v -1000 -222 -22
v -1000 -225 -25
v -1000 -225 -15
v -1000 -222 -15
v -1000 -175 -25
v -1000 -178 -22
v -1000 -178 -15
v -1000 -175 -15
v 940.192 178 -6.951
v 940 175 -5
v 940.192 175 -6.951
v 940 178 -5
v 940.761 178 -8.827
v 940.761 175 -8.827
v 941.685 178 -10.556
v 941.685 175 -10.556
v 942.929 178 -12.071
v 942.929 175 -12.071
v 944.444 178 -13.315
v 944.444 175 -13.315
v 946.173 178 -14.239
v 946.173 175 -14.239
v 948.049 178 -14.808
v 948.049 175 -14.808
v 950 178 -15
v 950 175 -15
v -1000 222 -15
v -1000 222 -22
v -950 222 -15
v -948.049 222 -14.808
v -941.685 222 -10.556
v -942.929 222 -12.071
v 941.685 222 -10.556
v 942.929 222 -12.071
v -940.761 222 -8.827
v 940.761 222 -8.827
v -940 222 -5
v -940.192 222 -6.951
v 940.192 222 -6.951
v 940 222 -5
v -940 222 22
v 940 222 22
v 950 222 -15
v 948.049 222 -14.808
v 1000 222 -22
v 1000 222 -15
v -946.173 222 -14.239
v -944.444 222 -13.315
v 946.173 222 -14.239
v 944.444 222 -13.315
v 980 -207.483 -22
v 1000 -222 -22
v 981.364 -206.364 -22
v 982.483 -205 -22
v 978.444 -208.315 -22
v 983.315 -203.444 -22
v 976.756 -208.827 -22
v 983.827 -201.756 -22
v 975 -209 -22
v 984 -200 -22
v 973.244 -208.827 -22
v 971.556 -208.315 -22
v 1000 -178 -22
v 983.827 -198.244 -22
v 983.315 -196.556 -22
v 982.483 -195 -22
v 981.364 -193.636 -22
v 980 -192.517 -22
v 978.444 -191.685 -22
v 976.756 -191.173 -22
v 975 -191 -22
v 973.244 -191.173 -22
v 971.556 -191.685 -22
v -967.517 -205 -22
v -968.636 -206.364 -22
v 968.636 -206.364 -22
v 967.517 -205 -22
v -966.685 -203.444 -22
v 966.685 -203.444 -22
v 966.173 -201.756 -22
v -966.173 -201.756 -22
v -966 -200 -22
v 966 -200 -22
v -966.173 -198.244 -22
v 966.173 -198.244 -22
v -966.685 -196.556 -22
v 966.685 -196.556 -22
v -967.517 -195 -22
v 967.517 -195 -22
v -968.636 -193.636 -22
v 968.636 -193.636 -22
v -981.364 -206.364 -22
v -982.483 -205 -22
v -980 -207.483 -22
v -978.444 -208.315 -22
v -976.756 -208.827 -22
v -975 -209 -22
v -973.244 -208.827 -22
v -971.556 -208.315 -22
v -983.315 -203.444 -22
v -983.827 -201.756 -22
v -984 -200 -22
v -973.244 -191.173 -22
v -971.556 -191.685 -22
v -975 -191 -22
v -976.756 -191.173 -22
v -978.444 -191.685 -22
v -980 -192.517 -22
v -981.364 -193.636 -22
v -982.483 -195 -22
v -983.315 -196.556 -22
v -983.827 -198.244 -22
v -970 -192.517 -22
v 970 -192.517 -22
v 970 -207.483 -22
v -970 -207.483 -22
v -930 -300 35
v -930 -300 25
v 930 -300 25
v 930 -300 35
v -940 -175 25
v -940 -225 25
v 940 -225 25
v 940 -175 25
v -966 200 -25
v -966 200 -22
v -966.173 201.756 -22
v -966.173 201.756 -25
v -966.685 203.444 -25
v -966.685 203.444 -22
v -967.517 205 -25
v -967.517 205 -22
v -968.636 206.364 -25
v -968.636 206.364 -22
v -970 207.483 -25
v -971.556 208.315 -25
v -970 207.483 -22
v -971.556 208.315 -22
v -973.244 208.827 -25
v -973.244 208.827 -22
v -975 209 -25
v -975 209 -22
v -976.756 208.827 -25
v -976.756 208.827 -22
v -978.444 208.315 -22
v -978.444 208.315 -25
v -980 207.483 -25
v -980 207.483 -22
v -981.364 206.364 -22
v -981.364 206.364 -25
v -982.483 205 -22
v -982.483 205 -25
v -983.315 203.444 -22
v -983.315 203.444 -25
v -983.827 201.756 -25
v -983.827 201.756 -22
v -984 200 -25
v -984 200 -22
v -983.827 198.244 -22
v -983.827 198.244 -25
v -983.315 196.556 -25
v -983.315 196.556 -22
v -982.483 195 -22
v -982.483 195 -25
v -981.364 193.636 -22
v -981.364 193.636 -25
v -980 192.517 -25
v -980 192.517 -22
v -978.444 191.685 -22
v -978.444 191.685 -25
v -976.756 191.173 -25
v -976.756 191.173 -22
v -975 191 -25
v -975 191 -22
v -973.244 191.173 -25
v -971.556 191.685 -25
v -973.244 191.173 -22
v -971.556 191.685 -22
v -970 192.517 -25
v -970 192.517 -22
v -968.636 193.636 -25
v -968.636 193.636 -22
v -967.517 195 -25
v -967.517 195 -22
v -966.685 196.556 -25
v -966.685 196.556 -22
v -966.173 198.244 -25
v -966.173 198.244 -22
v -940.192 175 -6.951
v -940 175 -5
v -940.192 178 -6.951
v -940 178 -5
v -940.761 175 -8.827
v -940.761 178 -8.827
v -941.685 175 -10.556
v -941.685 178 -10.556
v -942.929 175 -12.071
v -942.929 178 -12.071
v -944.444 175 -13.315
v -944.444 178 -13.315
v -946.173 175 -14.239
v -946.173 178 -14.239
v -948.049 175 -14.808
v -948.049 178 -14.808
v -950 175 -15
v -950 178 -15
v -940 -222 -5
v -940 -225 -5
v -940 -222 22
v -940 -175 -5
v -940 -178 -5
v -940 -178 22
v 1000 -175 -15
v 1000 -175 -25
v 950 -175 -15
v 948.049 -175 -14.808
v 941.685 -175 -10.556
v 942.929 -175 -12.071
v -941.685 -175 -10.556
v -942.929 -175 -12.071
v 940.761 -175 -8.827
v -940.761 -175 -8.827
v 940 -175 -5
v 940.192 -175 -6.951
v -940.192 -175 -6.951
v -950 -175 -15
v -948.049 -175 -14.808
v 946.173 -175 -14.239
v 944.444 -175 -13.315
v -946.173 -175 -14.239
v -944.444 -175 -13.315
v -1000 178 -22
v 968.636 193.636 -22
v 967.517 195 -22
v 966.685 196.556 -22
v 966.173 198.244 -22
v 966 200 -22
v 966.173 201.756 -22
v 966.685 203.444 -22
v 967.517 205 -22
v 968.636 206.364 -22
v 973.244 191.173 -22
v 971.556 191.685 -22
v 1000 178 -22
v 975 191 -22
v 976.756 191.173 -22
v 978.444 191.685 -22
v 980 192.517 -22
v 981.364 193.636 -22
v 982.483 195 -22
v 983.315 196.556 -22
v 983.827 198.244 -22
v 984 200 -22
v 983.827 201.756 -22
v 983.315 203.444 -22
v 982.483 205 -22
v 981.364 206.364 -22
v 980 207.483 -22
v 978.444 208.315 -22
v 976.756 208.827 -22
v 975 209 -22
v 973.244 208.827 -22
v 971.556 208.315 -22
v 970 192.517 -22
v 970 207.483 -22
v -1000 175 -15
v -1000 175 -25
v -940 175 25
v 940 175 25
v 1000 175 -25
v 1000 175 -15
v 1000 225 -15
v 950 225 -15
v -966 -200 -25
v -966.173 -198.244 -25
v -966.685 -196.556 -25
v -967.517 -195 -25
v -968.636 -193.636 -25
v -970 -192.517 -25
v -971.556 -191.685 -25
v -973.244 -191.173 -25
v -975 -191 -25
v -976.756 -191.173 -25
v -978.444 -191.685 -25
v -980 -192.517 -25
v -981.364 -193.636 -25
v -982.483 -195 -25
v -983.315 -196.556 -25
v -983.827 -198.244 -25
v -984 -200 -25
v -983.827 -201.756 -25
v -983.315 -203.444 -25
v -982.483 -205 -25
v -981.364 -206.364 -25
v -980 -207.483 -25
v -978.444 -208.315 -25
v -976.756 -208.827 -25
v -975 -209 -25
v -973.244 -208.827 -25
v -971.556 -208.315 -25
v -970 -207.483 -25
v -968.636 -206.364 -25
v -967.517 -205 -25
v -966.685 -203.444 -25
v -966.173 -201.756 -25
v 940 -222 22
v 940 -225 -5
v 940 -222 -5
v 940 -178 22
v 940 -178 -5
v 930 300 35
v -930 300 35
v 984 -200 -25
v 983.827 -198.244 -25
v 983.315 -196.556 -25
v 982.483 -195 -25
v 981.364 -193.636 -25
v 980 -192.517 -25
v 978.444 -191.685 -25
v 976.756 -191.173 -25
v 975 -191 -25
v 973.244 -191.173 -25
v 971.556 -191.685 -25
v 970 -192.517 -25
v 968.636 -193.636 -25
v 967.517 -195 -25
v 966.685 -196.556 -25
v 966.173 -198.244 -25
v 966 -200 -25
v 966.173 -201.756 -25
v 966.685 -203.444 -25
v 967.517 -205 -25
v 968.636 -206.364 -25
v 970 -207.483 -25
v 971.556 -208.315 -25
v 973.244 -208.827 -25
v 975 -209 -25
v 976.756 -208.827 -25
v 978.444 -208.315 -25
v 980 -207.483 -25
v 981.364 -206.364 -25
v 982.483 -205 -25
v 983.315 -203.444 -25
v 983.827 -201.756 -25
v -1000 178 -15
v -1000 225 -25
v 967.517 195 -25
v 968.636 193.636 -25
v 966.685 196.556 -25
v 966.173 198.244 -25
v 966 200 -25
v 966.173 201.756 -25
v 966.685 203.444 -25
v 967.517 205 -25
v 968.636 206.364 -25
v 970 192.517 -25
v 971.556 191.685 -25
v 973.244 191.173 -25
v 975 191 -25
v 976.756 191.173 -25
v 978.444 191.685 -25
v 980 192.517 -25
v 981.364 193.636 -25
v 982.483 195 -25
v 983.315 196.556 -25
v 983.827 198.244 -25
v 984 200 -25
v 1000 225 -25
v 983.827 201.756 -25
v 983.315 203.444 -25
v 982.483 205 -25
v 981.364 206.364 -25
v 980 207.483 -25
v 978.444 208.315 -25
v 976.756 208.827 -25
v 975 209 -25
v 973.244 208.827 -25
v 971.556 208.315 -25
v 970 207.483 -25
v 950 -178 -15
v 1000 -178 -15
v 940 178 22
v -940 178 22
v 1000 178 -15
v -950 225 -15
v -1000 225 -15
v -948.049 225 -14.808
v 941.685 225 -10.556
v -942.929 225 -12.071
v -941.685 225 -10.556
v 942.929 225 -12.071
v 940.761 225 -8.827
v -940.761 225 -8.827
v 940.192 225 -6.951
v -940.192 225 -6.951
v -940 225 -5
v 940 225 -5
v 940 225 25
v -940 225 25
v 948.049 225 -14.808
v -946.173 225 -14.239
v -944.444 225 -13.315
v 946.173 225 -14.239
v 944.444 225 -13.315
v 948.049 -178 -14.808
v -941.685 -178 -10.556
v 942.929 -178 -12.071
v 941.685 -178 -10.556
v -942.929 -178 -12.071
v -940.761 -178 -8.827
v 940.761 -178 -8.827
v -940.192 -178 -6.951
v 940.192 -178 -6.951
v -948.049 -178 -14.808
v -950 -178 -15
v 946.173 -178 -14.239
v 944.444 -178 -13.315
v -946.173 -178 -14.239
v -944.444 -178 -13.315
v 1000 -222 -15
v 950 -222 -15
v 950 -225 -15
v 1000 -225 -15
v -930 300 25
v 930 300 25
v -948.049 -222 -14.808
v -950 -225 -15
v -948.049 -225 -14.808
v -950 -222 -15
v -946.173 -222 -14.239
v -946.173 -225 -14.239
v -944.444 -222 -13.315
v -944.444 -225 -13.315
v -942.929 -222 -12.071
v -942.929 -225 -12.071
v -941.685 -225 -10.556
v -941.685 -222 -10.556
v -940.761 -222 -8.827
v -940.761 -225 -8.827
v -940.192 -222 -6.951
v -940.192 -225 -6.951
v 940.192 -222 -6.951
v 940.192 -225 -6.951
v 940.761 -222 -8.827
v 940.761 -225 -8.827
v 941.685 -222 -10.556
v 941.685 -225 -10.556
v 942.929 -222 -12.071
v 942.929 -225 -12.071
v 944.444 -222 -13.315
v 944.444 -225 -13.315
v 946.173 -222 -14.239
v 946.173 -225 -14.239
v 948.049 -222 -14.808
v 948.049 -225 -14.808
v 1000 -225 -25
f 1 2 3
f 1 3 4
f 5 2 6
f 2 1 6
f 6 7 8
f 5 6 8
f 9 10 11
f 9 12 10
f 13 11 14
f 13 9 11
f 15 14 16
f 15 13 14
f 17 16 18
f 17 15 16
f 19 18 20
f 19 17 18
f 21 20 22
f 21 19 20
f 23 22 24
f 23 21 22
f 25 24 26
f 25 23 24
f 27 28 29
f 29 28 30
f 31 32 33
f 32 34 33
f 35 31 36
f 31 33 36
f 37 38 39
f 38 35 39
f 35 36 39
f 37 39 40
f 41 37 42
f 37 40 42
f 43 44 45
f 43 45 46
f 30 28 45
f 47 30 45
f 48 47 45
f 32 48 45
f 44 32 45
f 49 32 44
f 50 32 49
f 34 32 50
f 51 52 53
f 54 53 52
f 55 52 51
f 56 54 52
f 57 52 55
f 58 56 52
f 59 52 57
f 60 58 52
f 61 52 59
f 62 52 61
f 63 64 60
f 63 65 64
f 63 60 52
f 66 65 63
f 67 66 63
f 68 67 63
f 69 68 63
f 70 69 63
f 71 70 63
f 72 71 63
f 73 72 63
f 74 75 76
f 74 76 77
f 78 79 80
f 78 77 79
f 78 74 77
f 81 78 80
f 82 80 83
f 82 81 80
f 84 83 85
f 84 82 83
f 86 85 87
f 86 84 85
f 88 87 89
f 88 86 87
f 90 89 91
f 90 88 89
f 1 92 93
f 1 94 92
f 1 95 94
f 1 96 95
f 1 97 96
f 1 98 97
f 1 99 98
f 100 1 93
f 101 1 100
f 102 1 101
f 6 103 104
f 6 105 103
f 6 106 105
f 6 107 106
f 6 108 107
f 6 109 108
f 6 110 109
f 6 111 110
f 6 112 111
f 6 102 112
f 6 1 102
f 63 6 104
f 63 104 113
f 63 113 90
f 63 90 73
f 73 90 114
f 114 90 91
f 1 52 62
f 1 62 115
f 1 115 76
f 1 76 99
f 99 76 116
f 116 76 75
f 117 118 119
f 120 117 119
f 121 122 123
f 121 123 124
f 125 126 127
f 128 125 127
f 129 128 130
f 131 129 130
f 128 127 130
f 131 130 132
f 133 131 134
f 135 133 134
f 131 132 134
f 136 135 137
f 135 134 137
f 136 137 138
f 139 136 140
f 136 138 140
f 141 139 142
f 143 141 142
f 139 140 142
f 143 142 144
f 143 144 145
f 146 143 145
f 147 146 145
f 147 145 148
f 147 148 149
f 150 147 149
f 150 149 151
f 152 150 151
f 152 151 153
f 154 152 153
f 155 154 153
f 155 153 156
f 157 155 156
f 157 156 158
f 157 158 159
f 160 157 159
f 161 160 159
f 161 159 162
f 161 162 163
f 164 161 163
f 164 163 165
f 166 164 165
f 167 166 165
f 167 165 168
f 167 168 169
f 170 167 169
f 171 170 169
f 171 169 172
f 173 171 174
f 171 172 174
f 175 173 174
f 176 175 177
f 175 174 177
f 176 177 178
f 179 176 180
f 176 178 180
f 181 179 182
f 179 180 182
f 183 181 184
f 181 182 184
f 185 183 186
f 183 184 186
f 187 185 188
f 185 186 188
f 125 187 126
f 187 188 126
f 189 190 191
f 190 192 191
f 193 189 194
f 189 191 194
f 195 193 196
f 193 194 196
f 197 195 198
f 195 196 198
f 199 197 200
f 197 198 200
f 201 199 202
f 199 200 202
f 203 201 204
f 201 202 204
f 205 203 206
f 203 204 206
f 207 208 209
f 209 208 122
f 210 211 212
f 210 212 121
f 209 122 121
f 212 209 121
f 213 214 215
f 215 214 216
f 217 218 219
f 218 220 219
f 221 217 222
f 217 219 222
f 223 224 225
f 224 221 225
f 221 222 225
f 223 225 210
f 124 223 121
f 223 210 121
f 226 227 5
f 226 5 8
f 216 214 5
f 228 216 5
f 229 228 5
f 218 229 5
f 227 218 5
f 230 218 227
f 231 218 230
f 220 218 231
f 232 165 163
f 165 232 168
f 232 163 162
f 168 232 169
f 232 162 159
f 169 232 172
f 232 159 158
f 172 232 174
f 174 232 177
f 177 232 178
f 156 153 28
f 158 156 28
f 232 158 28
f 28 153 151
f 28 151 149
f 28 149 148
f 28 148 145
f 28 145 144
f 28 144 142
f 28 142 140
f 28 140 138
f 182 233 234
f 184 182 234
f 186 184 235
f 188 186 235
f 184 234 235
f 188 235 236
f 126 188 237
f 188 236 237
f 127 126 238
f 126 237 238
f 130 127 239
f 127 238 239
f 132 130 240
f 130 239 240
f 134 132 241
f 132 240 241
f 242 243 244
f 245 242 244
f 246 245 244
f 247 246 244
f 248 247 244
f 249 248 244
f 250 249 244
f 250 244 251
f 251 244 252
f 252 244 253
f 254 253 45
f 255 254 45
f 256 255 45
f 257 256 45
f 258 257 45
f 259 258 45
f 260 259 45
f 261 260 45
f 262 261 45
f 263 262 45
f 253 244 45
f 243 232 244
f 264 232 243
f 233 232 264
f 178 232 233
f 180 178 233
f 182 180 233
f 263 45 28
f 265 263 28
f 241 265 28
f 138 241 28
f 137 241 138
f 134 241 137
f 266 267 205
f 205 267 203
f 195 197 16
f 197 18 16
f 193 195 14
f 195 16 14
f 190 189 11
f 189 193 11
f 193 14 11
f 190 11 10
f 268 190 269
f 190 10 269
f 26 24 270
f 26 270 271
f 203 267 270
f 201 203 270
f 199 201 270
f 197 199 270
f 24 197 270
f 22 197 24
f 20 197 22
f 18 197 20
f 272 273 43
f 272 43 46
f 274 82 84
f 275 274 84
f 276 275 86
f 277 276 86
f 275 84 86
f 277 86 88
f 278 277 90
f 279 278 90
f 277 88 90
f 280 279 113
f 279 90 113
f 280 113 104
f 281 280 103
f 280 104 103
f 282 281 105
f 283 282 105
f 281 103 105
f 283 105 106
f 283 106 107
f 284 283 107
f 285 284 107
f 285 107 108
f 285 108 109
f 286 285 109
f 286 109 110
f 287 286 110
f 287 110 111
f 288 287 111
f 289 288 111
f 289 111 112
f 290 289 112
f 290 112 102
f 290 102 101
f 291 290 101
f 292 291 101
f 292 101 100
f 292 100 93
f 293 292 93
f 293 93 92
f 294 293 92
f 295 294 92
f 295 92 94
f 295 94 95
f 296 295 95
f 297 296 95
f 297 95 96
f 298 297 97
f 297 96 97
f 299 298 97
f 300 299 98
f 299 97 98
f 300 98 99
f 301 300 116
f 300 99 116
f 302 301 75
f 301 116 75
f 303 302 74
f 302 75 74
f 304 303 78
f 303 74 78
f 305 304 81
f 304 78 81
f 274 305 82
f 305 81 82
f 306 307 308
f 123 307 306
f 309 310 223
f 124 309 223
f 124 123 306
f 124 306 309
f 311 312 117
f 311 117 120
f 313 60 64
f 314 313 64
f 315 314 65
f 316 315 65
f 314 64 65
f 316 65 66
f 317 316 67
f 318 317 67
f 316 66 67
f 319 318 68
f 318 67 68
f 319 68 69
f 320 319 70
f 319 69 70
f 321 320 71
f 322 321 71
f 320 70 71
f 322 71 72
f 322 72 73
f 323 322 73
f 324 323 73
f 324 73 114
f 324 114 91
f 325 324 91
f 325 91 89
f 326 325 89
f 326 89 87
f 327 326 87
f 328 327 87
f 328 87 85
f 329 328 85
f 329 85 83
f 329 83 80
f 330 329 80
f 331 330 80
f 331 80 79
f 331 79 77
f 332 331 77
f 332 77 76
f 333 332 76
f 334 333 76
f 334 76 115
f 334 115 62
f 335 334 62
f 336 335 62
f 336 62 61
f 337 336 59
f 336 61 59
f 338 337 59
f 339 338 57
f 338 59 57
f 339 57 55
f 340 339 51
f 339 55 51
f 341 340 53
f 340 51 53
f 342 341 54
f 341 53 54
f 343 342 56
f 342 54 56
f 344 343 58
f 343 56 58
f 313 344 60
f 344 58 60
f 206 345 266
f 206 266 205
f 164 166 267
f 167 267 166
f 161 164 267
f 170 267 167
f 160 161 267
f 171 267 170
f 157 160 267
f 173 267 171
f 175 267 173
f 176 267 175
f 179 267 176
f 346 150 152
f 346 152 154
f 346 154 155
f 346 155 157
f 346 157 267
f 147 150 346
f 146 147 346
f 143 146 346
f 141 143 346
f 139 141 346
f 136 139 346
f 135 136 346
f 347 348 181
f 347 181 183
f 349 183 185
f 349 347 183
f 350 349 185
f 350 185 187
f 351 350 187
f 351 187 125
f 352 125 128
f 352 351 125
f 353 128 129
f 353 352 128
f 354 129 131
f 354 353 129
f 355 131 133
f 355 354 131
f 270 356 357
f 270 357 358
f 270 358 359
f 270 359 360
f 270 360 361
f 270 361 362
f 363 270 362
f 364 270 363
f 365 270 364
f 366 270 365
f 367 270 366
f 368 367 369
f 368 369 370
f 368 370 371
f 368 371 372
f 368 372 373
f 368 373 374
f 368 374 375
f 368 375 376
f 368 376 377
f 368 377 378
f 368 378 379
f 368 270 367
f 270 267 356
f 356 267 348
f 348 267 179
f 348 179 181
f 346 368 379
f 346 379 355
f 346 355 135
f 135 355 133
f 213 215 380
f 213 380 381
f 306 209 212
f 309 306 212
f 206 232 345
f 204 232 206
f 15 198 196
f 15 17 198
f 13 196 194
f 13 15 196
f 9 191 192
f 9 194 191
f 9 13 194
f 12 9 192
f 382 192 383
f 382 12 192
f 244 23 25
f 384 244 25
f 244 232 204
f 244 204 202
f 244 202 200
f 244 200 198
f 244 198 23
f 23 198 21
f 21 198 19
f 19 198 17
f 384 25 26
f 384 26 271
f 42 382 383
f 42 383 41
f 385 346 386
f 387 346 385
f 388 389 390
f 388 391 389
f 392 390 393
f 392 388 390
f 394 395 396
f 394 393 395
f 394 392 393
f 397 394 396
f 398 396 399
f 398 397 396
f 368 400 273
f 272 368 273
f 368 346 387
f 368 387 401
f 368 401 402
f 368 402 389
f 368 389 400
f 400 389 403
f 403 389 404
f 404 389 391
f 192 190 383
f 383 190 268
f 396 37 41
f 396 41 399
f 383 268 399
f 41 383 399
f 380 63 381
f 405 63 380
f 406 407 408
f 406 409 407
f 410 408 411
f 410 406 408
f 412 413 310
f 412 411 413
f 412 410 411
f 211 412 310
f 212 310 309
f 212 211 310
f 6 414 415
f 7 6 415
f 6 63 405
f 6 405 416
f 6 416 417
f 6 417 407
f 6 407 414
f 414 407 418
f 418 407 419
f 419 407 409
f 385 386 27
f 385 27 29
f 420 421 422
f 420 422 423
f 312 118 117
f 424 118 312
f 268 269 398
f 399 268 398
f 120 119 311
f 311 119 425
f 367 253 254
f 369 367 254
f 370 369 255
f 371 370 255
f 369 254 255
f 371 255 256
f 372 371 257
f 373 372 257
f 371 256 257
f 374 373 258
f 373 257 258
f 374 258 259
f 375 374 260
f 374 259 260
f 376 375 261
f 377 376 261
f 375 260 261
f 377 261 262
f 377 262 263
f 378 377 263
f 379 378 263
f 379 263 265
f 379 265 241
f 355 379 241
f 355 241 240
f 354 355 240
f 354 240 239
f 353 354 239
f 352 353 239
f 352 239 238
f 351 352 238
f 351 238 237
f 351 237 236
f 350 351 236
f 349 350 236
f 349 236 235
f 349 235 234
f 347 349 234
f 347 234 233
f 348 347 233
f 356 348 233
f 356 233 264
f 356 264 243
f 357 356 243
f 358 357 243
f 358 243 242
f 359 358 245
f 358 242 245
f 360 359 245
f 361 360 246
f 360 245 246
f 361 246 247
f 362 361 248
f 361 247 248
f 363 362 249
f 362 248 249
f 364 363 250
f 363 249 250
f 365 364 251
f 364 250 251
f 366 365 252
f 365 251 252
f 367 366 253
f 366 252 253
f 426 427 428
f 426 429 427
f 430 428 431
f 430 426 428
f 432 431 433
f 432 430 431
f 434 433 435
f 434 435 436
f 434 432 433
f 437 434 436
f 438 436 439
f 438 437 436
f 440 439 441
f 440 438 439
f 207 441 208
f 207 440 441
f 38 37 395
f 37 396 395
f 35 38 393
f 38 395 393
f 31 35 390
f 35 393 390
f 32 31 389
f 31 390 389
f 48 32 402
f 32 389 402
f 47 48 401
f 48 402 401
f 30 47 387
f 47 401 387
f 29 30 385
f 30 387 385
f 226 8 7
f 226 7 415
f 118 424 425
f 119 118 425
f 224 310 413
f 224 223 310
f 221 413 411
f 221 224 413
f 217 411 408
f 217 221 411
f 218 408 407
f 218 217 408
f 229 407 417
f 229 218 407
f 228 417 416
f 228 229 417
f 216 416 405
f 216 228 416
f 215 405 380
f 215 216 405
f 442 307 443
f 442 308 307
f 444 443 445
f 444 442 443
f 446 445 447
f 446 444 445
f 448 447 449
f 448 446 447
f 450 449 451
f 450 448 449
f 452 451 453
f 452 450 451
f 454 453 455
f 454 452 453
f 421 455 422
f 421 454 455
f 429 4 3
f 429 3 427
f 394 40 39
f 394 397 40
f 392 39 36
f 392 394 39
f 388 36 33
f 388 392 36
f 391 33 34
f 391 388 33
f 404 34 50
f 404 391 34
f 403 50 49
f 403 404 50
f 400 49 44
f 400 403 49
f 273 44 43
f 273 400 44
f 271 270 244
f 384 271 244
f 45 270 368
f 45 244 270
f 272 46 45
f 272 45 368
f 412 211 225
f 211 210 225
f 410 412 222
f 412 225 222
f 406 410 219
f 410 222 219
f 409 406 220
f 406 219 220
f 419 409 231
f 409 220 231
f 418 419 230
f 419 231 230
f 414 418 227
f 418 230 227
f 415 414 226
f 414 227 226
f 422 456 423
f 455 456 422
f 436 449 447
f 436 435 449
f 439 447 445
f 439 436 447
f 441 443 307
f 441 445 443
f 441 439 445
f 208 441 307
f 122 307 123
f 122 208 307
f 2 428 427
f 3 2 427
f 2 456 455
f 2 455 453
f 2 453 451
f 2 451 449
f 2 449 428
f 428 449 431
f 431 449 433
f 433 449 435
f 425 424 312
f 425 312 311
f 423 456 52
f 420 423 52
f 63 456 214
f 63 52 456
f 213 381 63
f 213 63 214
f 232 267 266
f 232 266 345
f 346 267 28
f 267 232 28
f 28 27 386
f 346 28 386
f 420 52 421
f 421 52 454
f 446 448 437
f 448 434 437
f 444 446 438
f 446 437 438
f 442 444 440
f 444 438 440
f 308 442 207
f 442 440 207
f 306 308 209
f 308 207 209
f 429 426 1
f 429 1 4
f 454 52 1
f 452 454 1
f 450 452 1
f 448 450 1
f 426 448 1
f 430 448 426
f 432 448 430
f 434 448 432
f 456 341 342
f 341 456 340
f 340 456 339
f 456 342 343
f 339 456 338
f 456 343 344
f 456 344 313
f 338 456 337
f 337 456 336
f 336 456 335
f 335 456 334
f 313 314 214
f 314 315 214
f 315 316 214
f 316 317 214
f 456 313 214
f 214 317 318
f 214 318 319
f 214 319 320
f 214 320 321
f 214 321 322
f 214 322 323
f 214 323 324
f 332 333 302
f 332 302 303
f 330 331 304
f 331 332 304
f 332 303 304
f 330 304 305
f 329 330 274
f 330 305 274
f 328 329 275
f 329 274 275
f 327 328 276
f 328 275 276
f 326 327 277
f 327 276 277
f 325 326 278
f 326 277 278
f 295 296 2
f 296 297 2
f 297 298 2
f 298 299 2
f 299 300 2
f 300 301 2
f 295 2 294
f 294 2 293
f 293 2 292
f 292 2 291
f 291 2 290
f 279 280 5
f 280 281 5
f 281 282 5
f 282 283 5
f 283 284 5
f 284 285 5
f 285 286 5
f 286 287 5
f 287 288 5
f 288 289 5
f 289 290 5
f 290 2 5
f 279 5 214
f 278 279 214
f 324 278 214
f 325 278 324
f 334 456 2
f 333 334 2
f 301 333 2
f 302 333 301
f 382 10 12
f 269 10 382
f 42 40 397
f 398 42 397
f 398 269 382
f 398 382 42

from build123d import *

# Parameters (mm, degrees)
F0_W     = 50
F0_H     = 50
F0_W_2   = 44
F0_H_2   = 44
F1_DEPTH = 1000
F2_W     = 1860
F2_H     = 600
F3_DEPTH = 10
F4_W     = 60
F4_H     = 50
F5_DEPTH = 40
F6_R     = 10
F7_R     = 10
F8_R     = 9
F9_DEPTH = 5


with BuildPart() as f1:
    # F0 (on Right) → F1 (new body, symmetric)
    with BuildSketch(Plane.YZ):
        with Locations((-200, 0)):
            Rectangle(F0_W, F0_H)
        with Locations((-200, 0)):
            Rectangle(F0_W_2, F0_H_2, mode=Mode.SUBTRACT)
        with Locations((200, 0)):
            Rectangle(F0_W, F0_H)
        with Locations((200, 0)):
            Rectangle(F0_W_2, F0_H_2, mode=Mode.SUBTRACT)
    extrude(amount=F1_DEPTH, both=True)

    # F4 (on face) → F5 (cut)
    with BuildSketch(Plane.XY.offset(25)):
        with Locations((-970, 200)):
            Rectangle(F4_W, F4_H)
        with Locations((-970, -200)):
            Rectangle(F4_W, F4_H)
        with Locations((970, 200)):
            Rectangle(F4_W, F4_H)
        with Locations((970, -200)):
            Rectangle(F4_W, F4_H)
    extrude(amount=-F5_DEPTH, mode=Mode.SUBTRACT)

    # F6
    f6_edges = [f1.edges().sort_by_distance(p)[0] for p in [
        (-940, 176.5, -15),
        (-940, 223.5, -15),
        (-940, -223.5, -15),
        (-940, -176.5, -15),
    ]]
    fillet(f6_edges, radius=F6_R)

    # F7
    f7_edges = [f1.edges().sort_by_distance(p)[0] for p in [
        (940, -223.5, -15),
        (940, -176.5, -15),
        (940, 176.5, -15),
        (940, 223.5, -15),
    ]]
    fillet(f7_edges, radius=F7_R)

    # F8 (on face) → F9 (cut)
    with BuildSketch(Plane.XY.offset(-22)):
        with Locations((-975, 200)):
            Circle(F8_R)
        with Locations((-975, -200)):
            Circle(F8_R)
        with Locations((975, 200)):
            Circle(F8_R)
        with Locations((975, -200)):
            Circle(F8_R)
        with Locations((2925, 200)):
            Circle(F8_R)
        with Locations((2925, -200)):
            Circle(F8_R)
    extrude(amount=-F9_DEPTH, mode=Mode.SUBTRACT)


with BuildPart() as f3:
    # F2 (on face) → F3 (new body)
    with BuildSketch(Plane.XY.offset(25)):
        Rectangle(F2_W, F2_H)
    extrude(amount=F3_DEPTH)


solid = Compound([f1.part, f3.part])
